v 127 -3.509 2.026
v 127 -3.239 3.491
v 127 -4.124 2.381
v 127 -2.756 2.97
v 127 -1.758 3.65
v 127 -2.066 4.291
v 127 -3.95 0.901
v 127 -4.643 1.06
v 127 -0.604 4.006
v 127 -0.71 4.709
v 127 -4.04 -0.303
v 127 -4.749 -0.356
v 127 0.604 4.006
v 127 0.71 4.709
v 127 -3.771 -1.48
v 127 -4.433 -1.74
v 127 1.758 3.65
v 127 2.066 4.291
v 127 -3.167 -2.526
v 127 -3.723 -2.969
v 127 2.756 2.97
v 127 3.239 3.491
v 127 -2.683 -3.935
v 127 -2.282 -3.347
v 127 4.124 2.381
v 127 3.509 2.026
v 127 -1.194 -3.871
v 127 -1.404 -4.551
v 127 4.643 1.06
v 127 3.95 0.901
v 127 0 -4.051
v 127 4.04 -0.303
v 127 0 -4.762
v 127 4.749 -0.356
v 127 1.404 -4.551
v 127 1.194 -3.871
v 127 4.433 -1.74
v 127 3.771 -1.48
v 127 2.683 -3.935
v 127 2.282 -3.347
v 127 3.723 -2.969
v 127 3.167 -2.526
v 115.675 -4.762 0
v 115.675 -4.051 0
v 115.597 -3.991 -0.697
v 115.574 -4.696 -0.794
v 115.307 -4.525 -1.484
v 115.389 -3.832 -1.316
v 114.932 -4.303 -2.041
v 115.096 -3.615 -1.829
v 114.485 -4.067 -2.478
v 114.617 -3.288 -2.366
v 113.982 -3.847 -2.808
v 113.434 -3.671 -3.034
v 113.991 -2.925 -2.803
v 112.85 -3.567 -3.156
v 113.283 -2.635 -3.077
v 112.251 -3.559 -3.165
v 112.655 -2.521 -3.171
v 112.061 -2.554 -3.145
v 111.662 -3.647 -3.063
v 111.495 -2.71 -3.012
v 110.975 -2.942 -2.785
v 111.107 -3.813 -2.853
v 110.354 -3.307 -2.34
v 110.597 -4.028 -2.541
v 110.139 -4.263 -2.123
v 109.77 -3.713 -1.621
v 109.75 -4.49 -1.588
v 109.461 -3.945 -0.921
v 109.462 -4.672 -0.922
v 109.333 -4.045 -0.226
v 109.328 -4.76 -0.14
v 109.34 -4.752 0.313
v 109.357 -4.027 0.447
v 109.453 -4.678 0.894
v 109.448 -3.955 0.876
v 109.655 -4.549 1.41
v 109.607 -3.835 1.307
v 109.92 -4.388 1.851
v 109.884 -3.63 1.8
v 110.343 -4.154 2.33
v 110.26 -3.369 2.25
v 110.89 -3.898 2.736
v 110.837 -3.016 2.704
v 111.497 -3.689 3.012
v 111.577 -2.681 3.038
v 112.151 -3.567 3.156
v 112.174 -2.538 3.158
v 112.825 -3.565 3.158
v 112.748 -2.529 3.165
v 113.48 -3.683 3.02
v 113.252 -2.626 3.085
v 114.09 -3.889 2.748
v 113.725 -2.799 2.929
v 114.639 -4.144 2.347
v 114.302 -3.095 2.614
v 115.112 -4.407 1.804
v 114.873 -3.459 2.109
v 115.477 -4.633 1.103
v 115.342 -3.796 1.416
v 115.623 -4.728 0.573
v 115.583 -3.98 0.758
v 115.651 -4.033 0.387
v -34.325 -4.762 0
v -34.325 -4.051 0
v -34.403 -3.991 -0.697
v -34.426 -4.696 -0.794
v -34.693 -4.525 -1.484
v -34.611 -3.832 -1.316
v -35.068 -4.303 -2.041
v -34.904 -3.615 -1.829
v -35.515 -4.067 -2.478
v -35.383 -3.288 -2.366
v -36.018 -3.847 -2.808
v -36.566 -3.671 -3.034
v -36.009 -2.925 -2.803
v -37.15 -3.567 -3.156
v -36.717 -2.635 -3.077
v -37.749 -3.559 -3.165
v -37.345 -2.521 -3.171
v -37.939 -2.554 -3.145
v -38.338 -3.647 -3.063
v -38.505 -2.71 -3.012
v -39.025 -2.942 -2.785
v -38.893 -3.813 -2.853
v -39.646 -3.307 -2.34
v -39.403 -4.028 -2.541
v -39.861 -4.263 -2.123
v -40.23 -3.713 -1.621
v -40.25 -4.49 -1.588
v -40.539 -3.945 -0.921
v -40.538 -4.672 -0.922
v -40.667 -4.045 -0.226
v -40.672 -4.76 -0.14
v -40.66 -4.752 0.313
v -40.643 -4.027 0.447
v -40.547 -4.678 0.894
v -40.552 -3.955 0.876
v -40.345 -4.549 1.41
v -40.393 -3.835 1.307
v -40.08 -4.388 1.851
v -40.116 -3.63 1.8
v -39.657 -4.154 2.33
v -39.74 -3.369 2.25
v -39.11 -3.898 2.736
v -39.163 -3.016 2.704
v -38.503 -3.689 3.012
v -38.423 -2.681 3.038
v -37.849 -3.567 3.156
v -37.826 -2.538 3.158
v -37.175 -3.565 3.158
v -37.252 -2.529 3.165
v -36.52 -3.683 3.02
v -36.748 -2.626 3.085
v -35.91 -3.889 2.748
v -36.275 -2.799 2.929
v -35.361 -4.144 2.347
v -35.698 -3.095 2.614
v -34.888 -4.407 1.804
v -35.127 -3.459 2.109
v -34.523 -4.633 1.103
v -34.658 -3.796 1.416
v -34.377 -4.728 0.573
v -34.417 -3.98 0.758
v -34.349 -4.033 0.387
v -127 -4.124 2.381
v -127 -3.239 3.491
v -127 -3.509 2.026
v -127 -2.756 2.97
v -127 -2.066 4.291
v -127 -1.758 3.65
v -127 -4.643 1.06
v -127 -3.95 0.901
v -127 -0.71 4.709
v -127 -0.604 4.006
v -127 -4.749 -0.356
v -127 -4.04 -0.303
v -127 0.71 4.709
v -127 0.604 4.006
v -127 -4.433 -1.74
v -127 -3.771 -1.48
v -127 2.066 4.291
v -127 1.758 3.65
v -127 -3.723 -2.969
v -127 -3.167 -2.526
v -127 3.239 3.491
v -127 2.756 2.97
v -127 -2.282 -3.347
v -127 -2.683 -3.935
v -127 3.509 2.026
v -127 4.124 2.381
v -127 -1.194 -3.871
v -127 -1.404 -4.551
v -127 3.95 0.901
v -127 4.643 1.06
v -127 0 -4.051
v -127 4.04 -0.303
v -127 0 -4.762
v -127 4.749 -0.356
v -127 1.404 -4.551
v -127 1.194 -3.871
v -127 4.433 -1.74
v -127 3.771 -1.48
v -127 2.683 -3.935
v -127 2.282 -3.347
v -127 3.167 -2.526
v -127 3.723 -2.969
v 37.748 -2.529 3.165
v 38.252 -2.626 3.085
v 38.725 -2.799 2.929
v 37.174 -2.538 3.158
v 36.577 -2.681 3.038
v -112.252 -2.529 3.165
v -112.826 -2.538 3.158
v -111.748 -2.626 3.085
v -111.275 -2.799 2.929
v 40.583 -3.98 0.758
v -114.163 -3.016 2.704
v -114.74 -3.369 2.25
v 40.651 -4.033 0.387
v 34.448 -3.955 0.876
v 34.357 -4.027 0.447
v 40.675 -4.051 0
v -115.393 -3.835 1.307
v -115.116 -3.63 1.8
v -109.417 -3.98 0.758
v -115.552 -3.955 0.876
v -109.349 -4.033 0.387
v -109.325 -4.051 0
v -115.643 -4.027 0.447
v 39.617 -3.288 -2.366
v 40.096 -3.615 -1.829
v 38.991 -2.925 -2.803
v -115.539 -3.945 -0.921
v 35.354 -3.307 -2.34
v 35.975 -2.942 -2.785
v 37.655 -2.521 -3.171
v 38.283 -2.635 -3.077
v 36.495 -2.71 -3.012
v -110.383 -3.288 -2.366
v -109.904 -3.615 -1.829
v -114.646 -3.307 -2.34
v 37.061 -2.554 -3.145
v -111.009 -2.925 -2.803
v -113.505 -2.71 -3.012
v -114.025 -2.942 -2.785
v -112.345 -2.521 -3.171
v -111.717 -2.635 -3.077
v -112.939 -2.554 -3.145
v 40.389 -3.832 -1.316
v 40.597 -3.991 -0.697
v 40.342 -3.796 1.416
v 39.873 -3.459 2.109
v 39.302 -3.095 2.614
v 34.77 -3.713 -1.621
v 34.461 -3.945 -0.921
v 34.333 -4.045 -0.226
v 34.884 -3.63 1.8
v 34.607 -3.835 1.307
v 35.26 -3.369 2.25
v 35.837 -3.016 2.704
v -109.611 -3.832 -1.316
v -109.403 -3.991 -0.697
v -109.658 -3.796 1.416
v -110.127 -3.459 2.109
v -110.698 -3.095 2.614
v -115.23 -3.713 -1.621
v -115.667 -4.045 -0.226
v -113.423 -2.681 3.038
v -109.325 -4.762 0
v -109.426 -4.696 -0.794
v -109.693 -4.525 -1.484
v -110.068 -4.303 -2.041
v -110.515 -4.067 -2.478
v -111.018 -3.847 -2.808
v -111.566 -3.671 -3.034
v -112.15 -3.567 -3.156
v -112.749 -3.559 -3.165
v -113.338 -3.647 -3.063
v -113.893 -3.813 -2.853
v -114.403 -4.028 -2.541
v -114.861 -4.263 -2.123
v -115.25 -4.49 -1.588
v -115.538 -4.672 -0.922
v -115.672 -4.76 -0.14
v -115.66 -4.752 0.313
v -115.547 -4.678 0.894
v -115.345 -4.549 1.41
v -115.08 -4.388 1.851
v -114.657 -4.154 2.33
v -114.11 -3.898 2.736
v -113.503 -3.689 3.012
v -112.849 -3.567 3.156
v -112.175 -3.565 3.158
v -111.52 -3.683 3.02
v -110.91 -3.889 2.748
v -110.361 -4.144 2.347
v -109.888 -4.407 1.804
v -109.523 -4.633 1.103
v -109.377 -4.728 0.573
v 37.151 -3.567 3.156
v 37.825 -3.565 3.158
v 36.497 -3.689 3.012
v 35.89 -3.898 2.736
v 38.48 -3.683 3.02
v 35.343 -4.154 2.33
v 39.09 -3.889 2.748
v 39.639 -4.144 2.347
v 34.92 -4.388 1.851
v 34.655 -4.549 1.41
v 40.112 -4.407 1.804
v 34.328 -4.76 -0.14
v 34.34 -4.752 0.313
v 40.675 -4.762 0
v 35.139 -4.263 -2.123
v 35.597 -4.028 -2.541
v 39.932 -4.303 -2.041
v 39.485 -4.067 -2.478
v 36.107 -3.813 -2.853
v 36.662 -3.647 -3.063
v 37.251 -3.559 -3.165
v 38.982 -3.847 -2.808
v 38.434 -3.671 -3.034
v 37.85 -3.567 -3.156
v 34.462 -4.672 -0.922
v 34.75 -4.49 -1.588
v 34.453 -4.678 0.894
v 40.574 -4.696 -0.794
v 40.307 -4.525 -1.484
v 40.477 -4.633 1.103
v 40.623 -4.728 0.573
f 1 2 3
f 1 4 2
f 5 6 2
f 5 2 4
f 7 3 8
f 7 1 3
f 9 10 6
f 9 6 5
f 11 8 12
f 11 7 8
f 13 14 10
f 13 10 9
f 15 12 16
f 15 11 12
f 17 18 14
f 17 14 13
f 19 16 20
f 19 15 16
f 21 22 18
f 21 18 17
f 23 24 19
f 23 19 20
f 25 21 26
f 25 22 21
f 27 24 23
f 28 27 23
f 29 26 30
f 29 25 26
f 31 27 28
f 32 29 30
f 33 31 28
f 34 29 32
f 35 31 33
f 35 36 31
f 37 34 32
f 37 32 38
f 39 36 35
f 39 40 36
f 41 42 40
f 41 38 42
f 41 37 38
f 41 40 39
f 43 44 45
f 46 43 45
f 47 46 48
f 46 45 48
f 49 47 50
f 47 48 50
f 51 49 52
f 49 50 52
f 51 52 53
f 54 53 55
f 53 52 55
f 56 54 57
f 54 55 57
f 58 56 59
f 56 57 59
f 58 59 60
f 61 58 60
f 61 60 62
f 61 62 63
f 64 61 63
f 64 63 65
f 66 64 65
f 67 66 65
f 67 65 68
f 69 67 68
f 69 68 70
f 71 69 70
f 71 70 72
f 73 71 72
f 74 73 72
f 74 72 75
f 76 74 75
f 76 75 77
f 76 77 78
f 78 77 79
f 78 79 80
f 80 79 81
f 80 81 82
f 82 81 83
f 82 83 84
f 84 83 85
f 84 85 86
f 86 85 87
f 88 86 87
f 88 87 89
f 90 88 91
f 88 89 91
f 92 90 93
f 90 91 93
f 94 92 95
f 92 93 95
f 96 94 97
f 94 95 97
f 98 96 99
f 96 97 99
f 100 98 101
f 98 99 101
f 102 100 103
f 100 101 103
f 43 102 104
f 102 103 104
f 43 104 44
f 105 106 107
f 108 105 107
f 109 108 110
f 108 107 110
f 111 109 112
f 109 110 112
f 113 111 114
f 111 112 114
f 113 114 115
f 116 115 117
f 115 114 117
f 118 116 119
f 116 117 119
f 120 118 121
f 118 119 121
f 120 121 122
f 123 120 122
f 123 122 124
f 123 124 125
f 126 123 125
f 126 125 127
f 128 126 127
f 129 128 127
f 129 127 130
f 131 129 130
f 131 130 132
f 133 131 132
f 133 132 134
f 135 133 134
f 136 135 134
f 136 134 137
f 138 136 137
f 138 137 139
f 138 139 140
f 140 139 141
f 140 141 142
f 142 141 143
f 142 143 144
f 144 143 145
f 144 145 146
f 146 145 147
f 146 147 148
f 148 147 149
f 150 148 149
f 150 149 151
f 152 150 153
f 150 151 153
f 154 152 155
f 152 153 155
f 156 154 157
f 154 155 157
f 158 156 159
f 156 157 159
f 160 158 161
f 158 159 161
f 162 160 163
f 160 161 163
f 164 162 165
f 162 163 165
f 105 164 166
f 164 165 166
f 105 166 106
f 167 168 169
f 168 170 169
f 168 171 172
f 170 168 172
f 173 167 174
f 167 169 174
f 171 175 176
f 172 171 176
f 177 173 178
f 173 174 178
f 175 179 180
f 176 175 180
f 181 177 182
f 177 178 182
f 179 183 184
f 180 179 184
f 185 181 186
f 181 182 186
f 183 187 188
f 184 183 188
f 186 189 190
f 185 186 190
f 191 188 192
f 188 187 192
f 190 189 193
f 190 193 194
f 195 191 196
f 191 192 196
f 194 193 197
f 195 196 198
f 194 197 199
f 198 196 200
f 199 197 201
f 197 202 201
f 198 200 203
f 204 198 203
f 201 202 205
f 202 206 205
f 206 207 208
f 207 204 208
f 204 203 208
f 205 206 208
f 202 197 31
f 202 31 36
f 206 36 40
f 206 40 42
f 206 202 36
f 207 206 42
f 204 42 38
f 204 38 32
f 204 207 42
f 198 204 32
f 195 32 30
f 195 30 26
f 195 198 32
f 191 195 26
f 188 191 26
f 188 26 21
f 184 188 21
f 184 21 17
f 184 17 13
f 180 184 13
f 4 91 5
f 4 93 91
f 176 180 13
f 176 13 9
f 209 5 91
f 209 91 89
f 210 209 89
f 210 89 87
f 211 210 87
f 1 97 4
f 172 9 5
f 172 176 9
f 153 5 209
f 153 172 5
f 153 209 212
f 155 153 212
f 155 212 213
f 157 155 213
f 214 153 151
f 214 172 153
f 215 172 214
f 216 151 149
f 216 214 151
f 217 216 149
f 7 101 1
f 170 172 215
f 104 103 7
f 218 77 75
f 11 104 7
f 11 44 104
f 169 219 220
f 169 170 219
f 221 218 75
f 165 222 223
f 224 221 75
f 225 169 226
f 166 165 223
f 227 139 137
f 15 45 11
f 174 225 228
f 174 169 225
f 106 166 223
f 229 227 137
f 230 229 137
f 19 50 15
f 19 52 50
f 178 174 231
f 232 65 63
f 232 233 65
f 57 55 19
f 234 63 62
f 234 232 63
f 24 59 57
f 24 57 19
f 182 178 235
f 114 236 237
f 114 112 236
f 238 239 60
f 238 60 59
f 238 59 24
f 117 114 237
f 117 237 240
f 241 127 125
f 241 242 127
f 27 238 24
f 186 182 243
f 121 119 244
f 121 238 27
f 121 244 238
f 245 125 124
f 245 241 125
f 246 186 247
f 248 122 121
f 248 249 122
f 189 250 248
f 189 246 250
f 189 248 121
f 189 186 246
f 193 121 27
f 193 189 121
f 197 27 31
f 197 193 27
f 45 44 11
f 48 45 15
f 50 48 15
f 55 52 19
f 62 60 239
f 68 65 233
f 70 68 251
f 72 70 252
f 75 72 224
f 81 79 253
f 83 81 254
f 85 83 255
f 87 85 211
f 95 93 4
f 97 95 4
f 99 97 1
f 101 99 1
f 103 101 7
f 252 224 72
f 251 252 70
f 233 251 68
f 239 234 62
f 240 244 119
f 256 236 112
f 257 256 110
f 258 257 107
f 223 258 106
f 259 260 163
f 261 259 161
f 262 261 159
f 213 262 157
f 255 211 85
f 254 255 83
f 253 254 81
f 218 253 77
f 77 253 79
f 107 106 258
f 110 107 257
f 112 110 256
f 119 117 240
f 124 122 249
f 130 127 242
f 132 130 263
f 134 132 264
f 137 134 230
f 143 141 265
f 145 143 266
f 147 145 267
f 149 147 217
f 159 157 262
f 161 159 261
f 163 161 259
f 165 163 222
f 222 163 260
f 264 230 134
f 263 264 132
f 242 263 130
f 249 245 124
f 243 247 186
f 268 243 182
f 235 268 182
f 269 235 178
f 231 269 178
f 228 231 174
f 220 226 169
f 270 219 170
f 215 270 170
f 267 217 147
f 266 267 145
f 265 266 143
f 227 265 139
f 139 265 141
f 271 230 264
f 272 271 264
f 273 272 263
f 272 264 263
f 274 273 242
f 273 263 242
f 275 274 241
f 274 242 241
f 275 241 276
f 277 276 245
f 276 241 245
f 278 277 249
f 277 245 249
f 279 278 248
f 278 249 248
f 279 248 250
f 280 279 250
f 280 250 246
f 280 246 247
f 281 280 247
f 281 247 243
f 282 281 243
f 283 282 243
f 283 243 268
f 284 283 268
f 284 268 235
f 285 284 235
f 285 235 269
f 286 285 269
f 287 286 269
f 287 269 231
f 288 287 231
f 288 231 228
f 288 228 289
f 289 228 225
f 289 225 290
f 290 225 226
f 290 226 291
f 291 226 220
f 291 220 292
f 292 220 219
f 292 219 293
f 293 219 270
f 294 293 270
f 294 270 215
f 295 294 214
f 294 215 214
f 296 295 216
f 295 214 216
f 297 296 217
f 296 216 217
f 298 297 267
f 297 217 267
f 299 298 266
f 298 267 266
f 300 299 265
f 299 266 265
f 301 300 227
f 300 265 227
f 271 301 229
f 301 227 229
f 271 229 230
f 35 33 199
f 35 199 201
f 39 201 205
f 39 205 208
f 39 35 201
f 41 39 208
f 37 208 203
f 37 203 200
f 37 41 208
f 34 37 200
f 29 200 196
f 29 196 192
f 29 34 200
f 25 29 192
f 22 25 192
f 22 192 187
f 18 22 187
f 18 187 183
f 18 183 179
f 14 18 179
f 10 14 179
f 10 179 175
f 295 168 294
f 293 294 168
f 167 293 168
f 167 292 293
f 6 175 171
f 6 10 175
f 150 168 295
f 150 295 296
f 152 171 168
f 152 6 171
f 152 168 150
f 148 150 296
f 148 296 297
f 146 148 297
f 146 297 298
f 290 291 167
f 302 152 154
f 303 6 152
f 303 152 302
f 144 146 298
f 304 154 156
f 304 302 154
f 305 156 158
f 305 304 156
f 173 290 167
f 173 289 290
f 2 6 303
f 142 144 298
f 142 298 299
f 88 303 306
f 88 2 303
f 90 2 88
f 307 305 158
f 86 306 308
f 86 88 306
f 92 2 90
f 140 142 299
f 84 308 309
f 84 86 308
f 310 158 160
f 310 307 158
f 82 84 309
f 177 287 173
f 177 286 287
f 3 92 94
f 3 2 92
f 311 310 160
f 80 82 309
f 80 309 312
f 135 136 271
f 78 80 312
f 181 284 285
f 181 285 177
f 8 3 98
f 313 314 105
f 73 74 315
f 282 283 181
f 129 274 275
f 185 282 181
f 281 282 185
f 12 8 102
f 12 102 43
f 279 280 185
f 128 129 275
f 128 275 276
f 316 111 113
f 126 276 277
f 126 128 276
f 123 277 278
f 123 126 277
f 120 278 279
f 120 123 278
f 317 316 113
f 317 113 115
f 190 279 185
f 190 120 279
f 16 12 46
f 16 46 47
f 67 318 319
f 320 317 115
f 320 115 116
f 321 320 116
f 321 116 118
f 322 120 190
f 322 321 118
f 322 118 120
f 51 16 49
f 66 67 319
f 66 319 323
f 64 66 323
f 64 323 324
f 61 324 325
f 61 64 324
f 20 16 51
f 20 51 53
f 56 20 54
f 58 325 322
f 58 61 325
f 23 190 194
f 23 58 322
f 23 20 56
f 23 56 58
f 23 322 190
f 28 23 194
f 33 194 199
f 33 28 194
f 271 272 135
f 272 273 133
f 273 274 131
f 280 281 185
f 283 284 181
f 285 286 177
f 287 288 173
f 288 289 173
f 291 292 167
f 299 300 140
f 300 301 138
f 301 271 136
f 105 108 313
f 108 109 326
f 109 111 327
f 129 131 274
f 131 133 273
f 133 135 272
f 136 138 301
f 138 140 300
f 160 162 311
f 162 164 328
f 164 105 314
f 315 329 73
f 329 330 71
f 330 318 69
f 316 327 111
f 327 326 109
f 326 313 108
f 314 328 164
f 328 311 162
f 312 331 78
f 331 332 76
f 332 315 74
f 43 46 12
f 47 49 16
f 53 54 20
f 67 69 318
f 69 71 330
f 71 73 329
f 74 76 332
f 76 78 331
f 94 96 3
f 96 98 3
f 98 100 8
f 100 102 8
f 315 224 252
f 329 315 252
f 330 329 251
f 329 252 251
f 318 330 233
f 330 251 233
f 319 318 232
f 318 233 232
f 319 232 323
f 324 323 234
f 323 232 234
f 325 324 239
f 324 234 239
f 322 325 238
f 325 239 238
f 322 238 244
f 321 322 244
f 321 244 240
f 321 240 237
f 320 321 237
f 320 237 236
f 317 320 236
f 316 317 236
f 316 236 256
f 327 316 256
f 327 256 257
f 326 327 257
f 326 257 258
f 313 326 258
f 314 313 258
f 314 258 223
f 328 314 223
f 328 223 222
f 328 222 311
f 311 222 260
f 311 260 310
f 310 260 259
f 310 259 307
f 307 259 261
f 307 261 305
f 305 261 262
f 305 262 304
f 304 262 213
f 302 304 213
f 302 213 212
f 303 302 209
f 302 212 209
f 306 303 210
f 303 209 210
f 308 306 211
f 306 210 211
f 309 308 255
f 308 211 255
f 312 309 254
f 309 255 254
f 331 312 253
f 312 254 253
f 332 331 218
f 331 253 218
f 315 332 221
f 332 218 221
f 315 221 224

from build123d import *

# Parameters (mm, degrees)
SKETCH1_R           = 4.7625
SKETCH1_R_2         = 4.0513
BOSS_EXTRUDE1_DEPTH = 127
SKETCH2_R           = 3.175
CUT_EXTRUDE1_DEPTH  = 5.7625


with BuildPart() as part:
    # Sketch1 → Boss-Extrude1 (new body, symmetric)
    with BuildSketch(Plane(origin=(0, 0, 0), x_dir=(0, 0, -1), z_dir=(1, 0, 0))):
        Circle(SKETCH1_R)
        Circle(SKETCH1_R_2, mode=Mode.SUBTRACT)
    extrude(amount=BOSS_EXTRUDE1_DEPTH, both=True)

    # Sketch2 → Cut-Extrude1 (cut, through all)
    with BuildSketch(Plane(origin=(0, 0, 0), x_dir=(1, 0, 0), z_dir=(0, 1, 0))):
        with Locations((-112.5, 0)):
            Circle(SKETCH2_R)
        with Locations((-37.5, 0)):
            Circle(SKETCH2_R)
        with Locations((37.5, 0)):
            Circle(SKETCH2_R)
        with Locations((112.5, 0)):
            Circle(SKETCH2_R)
    extrude(amount=-CUT_EXTRUDE1_DEPTH, mode=Mode.SUBTRACT)


solid = part.part
